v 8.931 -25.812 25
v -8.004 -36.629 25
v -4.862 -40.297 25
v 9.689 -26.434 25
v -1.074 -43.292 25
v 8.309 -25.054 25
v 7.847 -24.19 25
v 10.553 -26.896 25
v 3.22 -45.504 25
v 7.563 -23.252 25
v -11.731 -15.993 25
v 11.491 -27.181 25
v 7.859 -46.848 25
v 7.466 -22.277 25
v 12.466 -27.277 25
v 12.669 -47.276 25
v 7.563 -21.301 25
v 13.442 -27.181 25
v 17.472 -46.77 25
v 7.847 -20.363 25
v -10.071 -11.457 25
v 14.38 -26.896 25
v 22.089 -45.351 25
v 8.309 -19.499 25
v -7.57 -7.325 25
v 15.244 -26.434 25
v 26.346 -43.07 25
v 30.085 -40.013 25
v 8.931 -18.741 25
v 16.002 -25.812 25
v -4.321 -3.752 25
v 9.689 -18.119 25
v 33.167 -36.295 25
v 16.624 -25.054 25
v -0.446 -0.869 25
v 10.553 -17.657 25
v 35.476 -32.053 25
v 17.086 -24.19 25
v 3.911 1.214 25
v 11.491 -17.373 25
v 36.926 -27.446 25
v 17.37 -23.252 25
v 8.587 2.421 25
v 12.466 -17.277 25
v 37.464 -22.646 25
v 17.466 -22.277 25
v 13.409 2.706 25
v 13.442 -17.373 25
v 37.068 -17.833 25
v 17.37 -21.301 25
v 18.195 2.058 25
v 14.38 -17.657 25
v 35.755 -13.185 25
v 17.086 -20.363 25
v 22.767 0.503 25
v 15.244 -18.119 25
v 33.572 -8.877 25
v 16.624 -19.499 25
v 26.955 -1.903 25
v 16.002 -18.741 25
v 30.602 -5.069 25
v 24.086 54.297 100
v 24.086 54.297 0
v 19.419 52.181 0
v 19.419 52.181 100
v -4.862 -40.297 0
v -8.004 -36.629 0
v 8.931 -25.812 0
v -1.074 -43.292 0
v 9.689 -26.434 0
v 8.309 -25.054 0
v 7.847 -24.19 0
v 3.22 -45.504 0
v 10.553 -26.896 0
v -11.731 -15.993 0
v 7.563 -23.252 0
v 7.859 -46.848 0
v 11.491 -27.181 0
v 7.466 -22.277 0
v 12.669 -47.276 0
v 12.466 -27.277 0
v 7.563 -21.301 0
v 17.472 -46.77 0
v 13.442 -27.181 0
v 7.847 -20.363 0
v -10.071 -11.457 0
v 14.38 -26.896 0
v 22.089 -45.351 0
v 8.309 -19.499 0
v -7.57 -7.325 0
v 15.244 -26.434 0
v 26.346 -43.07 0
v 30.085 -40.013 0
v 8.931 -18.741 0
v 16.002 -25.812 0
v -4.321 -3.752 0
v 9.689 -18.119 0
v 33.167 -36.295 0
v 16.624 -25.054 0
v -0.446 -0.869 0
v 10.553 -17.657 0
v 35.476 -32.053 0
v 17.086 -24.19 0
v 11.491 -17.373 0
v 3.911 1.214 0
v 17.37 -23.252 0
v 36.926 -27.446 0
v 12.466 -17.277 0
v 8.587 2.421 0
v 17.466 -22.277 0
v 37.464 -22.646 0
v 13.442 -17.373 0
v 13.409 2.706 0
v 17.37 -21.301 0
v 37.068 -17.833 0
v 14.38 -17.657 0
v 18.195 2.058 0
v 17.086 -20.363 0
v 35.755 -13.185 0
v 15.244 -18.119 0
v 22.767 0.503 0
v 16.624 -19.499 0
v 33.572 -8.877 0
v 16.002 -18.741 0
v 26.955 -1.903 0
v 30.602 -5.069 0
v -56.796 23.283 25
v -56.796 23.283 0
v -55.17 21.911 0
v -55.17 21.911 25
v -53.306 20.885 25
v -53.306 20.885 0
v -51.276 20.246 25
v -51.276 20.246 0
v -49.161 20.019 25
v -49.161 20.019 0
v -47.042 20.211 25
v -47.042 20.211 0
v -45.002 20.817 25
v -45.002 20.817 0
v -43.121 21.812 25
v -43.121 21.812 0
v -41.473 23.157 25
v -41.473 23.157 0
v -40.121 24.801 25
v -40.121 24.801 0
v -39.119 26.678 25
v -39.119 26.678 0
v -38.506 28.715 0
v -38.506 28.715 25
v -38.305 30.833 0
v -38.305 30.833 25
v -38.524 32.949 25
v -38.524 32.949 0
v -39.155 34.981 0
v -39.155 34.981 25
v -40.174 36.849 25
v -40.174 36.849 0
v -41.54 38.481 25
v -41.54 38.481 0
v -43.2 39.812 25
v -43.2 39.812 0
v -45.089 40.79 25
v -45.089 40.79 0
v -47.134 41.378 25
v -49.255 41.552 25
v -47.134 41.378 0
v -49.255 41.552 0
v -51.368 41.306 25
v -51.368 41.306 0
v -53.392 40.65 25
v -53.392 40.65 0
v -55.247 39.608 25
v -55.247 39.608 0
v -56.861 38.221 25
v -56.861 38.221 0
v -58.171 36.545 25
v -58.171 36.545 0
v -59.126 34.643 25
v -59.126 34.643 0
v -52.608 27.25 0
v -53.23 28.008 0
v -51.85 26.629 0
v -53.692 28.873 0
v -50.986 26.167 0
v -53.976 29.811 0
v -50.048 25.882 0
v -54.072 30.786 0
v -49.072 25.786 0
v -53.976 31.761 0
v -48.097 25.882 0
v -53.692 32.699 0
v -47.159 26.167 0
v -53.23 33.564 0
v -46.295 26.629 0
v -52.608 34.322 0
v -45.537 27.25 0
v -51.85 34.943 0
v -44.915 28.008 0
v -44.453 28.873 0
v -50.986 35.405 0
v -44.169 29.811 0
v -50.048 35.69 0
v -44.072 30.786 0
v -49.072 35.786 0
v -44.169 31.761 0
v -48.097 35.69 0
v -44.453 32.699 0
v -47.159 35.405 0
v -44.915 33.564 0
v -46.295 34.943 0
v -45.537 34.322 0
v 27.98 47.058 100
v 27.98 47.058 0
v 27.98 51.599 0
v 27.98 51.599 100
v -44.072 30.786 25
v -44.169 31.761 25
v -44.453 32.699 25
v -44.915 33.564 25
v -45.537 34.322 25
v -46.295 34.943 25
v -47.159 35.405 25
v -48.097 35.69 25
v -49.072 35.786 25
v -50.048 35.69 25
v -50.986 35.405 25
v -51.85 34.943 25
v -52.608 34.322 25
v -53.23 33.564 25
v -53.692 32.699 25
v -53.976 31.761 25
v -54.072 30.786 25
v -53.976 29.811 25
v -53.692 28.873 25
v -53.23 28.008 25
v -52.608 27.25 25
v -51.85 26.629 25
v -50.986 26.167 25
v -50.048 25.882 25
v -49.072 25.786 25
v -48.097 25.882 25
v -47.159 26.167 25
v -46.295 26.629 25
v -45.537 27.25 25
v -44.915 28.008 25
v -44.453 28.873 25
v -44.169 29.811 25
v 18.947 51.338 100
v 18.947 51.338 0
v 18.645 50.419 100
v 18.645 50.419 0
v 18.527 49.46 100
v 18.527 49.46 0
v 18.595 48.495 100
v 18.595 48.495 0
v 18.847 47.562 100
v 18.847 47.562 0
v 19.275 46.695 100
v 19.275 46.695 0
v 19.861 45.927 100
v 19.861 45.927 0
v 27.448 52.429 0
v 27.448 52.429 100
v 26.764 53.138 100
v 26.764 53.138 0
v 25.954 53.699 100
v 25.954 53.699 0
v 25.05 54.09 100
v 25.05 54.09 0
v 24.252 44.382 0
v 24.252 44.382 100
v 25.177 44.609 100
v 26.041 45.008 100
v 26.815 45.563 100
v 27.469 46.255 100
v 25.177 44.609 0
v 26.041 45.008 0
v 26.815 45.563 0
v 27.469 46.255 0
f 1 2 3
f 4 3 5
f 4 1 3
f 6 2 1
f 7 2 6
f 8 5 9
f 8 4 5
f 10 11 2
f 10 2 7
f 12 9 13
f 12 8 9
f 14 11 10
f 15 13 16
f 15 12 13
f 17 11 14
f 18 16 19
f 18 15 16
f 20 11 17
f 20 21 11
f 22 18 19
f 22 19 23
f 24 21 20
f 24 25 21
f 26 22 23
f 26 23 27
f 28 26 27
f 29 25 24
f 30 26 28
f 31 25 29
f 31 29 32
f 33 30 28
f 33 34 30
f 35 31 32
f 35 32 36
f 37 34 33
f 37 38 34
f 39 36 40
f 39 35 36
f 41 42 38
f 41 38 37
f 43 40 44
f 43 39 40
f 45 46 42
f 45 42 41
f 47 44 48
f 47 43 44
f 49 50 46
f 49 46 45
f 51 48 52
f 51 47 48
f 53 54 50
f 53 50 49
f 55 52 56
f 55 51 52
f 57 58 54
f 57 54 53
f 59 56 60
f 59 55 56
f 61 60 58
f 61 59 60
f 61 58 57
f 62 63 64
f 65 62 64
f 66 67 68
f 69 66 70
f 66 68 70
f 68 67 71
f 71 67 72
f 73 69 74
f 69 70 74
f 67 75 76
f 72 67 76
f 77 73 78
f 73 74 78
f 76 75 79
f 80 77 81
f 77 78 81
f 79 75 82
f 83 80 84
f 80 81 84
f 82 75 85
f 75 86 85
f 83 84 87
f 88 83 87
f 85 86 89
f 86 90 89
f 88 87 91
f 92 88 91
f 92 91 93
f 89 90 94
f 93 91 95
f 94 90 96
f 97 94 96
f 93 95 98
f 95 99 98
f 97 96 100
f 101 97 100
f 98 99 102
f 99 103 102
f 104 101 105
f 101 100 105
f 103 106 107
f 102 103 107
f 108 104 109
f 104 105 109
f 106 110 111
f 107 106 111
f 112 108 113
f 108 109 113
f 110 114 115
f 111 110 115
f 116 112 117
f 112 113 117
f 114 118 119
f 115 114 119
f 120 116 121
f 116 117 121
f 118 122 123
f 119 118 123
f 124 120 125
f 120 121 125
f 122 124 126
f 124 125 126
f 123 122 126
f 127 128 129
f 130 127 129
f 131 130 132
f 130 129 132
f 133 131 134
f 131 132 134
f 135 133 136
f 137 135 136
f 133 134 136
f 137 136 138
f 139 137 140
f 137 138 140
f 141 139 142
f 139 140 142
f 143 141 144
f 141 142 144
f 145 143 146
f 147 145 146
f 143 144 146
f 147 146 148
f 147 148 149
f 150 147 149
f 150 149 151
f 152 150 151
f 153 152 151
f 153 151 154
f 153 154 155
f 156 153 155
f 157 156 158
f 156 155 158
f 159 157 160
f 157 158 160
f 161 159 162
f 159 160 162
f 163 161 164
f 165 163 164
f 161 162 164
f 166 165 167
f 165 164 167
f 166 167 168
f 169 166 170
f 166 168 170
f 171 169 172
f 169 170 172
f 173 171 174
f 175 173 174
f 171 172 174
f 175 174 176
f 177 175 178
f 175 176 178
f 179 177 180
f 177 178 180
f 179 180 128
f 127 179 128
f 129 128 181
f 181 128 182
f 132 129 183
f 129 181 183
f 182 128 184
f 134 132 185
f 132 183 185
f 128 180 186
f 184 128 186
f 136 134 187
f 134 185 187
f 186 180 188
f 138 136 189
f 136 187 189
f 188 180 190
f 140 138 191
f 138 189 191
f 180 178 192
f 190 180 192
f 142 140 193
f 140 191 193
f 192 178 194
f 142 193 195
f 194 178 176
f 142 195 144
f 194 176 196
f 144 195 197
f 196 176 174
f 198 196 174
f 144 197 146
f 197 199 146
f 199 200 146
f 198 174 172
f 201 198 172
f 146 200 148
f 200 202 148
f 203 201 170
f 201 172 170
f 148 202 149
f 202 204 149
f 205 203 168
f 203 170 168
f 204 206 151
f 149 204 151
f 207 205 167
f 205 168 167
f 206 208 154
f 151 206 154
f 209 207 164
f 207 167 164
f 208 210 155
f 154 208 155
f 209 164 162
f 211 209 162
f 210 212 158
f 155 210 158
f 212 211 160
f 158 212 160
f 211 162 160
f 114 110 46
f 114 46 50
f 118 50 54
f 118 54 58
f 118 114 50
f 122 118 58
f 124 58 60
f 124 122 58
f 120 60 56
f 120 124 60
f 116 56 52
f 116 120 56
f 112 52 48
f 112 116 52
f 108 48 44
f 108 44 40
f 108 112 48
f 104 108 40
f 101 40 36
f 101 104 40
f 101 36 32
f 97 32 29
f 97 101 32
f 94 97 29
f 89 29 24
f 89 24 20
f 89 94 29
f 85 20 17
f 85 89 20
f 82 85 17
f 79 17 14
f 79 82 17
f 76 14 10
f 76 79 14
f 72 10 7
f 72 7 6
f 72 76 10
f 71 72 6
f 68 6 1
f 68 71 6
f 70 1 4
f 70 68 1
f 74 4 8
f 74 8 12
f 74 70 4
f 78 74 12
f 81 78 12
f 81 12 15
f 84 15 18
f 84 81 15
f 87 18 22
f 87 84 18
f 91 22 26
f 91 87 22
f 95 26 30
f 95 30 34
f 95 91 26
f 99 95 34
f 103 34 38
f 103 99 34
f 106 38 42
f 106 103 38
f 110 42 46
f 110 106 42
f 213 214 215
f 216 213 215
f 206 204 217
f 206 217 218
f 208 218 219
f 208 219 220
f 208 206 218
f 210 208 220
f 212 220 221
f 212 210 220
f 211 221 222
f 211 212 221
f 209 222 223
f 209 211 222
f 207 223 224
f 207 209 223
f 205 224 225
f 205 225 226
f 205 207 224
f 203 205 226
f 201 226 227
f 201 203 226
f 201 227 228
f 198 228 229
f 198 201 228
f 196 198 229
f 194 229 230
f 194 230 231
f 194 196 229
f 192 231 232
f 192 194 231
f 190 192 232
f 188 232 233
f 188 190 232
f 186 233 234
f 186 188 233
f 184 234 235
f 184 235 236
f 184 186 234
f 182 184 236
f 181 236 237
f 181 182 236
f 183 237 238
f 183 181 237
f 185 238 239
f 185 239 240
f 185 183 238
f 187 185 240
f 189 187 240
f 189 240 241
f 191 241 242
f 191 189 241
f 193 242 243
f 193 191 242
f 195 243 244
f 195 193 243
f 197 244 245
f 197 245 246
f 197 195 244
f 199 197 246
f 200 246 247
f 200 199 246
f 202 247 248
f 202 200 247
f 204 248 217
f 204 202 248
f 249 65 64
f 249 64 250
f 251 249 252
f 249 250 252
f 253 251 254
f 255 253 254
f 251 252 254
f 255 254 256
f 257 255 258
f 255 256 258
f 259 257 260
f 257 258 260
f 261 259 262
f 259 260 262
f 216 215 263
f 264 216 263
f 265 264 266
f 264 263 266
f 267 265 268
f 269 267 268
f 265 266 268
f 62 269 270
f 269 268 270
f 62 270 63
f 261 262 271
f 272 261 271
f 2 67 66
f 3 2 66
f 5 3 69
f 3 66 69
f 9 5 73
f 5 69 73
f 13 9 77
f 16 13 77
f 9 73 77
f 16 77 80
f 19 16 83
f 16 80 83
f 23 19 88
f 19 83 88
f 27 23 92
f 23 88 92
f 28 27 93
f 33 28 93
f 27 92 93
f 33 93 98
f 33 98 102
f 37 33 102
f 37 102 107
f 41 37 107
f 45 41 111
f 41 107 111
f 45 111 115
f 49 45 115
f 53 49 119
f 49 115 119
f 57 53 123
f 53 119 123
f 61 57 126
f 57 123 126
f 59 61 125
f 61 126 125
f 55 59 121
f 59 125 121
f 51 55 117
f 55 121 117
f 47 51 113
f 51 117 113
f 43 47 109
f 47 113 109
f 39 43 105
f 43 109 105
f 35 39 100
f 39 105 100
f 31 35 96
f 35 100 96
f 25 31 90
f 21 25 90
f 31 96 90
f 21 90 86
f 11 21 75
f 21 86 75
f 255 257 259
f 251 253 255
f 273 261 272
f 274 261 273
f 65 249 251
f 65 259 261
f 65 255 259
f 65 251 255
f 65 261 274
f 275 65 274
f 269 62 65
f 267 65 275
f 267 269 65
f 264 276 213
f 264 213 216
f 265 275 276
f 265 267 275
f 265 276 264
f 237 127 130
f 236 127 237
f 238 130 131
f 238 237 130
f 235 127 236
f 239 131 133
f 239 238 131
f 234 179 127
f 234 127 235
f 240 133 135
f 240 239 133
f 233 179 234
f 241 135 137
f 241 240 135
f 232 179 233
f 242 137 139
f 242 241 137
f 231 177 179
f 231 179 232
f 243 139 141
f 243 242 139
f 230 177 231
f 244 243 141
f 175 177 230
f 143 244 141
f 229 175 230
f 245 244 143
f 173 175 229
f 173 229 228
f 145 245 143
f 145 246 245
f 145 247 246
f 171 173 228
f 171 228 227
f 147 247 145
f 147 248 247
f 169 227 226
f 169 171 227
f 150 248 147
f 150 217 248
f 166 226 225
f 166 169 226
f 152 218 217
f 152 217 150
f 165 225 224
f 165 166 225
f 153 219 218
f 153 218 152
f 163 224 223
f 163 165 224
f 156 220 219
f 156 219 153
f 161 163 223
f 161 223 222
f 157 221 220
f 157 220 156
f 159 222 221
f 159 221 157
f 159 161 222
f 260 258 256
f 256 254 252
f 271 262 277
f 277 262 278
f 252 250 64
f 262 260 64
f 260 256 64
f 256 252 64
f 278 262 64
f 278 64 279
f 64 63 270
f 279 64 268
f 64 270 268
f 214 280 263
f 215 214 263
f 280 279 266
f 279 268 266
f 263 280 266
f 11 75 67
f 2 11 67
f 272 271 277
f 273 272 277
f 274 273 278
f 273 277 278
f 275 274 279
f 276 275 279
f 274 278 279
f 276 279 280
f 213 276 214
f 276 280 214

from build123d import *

# Parameters (mm, degrees)
F0_R     = 5
F1_DEPTH = 25
F2_DEPTH = 25
F3_DEPTH = 100


with BuildPart() as f1:
    # F0 (on Top) → F1 (new body)
    with BuildSketch(Plane.XY):
        with BuildLine():
            Line((-59.125722, 34.643442), (-56.795796, 23.282852))
            ThreePointArc((-56.795796, 23.282852), (-38.52414, 32.949374), (-59.125722, 34.643442))
        make_face()
        with Locations((-49.072474, 30.786032)):
            Circle(F0_R, mode=Mode.SUBTRACT)
    extrude(amount=F1_DEPTH)


with BuildPart() as f2:
    # F0 (on Top) → F2 (new body)
    with BuildSketch(Plane.XY):
        with BuildLine():
            Line((-11.730899, -15.992574), (-8.00359, -36.628545))
            ThreePointArc((-8.00359, -36.628545), (37.068345, -17.832961), (-11.730899, -15.992574))
        make_face()
        with Locations((12.466434, -22.276606)):
            Circle(F0_R, mode=Mode.SUBTRACT)
    extrude(amount=F2_DEPTH)


with BuildPart() as f3:
    # F0 (on Top) → F3 (new body)
    with BuildSketch(Plane.XY):
        with BuildLine():
            Line((24.086133, 54.29682), (19.418732, 52.181195))
            ThreePointArc((19.418732, 52.181195), (18.537455, 48.975964), (19.860712, 45.926514))
            Line((19.860712, 45.926514), (24.252215, 44.381569))
            ThreePointArc((24.252215, 44.381569), (26.441083, 45.266809), (27.979693, 47.057751))
            Line((27.979693, 47.057751), (27.979693, 51.599059))
            ThreePointArc((27.979693, 51.599059), (26.372651, 53.438269), (24.086133, 54.29682))
        make_face()
    extrude(amount=F3_DEPTH)


solid = Compound([f1.part, f2.part, f3.part])
